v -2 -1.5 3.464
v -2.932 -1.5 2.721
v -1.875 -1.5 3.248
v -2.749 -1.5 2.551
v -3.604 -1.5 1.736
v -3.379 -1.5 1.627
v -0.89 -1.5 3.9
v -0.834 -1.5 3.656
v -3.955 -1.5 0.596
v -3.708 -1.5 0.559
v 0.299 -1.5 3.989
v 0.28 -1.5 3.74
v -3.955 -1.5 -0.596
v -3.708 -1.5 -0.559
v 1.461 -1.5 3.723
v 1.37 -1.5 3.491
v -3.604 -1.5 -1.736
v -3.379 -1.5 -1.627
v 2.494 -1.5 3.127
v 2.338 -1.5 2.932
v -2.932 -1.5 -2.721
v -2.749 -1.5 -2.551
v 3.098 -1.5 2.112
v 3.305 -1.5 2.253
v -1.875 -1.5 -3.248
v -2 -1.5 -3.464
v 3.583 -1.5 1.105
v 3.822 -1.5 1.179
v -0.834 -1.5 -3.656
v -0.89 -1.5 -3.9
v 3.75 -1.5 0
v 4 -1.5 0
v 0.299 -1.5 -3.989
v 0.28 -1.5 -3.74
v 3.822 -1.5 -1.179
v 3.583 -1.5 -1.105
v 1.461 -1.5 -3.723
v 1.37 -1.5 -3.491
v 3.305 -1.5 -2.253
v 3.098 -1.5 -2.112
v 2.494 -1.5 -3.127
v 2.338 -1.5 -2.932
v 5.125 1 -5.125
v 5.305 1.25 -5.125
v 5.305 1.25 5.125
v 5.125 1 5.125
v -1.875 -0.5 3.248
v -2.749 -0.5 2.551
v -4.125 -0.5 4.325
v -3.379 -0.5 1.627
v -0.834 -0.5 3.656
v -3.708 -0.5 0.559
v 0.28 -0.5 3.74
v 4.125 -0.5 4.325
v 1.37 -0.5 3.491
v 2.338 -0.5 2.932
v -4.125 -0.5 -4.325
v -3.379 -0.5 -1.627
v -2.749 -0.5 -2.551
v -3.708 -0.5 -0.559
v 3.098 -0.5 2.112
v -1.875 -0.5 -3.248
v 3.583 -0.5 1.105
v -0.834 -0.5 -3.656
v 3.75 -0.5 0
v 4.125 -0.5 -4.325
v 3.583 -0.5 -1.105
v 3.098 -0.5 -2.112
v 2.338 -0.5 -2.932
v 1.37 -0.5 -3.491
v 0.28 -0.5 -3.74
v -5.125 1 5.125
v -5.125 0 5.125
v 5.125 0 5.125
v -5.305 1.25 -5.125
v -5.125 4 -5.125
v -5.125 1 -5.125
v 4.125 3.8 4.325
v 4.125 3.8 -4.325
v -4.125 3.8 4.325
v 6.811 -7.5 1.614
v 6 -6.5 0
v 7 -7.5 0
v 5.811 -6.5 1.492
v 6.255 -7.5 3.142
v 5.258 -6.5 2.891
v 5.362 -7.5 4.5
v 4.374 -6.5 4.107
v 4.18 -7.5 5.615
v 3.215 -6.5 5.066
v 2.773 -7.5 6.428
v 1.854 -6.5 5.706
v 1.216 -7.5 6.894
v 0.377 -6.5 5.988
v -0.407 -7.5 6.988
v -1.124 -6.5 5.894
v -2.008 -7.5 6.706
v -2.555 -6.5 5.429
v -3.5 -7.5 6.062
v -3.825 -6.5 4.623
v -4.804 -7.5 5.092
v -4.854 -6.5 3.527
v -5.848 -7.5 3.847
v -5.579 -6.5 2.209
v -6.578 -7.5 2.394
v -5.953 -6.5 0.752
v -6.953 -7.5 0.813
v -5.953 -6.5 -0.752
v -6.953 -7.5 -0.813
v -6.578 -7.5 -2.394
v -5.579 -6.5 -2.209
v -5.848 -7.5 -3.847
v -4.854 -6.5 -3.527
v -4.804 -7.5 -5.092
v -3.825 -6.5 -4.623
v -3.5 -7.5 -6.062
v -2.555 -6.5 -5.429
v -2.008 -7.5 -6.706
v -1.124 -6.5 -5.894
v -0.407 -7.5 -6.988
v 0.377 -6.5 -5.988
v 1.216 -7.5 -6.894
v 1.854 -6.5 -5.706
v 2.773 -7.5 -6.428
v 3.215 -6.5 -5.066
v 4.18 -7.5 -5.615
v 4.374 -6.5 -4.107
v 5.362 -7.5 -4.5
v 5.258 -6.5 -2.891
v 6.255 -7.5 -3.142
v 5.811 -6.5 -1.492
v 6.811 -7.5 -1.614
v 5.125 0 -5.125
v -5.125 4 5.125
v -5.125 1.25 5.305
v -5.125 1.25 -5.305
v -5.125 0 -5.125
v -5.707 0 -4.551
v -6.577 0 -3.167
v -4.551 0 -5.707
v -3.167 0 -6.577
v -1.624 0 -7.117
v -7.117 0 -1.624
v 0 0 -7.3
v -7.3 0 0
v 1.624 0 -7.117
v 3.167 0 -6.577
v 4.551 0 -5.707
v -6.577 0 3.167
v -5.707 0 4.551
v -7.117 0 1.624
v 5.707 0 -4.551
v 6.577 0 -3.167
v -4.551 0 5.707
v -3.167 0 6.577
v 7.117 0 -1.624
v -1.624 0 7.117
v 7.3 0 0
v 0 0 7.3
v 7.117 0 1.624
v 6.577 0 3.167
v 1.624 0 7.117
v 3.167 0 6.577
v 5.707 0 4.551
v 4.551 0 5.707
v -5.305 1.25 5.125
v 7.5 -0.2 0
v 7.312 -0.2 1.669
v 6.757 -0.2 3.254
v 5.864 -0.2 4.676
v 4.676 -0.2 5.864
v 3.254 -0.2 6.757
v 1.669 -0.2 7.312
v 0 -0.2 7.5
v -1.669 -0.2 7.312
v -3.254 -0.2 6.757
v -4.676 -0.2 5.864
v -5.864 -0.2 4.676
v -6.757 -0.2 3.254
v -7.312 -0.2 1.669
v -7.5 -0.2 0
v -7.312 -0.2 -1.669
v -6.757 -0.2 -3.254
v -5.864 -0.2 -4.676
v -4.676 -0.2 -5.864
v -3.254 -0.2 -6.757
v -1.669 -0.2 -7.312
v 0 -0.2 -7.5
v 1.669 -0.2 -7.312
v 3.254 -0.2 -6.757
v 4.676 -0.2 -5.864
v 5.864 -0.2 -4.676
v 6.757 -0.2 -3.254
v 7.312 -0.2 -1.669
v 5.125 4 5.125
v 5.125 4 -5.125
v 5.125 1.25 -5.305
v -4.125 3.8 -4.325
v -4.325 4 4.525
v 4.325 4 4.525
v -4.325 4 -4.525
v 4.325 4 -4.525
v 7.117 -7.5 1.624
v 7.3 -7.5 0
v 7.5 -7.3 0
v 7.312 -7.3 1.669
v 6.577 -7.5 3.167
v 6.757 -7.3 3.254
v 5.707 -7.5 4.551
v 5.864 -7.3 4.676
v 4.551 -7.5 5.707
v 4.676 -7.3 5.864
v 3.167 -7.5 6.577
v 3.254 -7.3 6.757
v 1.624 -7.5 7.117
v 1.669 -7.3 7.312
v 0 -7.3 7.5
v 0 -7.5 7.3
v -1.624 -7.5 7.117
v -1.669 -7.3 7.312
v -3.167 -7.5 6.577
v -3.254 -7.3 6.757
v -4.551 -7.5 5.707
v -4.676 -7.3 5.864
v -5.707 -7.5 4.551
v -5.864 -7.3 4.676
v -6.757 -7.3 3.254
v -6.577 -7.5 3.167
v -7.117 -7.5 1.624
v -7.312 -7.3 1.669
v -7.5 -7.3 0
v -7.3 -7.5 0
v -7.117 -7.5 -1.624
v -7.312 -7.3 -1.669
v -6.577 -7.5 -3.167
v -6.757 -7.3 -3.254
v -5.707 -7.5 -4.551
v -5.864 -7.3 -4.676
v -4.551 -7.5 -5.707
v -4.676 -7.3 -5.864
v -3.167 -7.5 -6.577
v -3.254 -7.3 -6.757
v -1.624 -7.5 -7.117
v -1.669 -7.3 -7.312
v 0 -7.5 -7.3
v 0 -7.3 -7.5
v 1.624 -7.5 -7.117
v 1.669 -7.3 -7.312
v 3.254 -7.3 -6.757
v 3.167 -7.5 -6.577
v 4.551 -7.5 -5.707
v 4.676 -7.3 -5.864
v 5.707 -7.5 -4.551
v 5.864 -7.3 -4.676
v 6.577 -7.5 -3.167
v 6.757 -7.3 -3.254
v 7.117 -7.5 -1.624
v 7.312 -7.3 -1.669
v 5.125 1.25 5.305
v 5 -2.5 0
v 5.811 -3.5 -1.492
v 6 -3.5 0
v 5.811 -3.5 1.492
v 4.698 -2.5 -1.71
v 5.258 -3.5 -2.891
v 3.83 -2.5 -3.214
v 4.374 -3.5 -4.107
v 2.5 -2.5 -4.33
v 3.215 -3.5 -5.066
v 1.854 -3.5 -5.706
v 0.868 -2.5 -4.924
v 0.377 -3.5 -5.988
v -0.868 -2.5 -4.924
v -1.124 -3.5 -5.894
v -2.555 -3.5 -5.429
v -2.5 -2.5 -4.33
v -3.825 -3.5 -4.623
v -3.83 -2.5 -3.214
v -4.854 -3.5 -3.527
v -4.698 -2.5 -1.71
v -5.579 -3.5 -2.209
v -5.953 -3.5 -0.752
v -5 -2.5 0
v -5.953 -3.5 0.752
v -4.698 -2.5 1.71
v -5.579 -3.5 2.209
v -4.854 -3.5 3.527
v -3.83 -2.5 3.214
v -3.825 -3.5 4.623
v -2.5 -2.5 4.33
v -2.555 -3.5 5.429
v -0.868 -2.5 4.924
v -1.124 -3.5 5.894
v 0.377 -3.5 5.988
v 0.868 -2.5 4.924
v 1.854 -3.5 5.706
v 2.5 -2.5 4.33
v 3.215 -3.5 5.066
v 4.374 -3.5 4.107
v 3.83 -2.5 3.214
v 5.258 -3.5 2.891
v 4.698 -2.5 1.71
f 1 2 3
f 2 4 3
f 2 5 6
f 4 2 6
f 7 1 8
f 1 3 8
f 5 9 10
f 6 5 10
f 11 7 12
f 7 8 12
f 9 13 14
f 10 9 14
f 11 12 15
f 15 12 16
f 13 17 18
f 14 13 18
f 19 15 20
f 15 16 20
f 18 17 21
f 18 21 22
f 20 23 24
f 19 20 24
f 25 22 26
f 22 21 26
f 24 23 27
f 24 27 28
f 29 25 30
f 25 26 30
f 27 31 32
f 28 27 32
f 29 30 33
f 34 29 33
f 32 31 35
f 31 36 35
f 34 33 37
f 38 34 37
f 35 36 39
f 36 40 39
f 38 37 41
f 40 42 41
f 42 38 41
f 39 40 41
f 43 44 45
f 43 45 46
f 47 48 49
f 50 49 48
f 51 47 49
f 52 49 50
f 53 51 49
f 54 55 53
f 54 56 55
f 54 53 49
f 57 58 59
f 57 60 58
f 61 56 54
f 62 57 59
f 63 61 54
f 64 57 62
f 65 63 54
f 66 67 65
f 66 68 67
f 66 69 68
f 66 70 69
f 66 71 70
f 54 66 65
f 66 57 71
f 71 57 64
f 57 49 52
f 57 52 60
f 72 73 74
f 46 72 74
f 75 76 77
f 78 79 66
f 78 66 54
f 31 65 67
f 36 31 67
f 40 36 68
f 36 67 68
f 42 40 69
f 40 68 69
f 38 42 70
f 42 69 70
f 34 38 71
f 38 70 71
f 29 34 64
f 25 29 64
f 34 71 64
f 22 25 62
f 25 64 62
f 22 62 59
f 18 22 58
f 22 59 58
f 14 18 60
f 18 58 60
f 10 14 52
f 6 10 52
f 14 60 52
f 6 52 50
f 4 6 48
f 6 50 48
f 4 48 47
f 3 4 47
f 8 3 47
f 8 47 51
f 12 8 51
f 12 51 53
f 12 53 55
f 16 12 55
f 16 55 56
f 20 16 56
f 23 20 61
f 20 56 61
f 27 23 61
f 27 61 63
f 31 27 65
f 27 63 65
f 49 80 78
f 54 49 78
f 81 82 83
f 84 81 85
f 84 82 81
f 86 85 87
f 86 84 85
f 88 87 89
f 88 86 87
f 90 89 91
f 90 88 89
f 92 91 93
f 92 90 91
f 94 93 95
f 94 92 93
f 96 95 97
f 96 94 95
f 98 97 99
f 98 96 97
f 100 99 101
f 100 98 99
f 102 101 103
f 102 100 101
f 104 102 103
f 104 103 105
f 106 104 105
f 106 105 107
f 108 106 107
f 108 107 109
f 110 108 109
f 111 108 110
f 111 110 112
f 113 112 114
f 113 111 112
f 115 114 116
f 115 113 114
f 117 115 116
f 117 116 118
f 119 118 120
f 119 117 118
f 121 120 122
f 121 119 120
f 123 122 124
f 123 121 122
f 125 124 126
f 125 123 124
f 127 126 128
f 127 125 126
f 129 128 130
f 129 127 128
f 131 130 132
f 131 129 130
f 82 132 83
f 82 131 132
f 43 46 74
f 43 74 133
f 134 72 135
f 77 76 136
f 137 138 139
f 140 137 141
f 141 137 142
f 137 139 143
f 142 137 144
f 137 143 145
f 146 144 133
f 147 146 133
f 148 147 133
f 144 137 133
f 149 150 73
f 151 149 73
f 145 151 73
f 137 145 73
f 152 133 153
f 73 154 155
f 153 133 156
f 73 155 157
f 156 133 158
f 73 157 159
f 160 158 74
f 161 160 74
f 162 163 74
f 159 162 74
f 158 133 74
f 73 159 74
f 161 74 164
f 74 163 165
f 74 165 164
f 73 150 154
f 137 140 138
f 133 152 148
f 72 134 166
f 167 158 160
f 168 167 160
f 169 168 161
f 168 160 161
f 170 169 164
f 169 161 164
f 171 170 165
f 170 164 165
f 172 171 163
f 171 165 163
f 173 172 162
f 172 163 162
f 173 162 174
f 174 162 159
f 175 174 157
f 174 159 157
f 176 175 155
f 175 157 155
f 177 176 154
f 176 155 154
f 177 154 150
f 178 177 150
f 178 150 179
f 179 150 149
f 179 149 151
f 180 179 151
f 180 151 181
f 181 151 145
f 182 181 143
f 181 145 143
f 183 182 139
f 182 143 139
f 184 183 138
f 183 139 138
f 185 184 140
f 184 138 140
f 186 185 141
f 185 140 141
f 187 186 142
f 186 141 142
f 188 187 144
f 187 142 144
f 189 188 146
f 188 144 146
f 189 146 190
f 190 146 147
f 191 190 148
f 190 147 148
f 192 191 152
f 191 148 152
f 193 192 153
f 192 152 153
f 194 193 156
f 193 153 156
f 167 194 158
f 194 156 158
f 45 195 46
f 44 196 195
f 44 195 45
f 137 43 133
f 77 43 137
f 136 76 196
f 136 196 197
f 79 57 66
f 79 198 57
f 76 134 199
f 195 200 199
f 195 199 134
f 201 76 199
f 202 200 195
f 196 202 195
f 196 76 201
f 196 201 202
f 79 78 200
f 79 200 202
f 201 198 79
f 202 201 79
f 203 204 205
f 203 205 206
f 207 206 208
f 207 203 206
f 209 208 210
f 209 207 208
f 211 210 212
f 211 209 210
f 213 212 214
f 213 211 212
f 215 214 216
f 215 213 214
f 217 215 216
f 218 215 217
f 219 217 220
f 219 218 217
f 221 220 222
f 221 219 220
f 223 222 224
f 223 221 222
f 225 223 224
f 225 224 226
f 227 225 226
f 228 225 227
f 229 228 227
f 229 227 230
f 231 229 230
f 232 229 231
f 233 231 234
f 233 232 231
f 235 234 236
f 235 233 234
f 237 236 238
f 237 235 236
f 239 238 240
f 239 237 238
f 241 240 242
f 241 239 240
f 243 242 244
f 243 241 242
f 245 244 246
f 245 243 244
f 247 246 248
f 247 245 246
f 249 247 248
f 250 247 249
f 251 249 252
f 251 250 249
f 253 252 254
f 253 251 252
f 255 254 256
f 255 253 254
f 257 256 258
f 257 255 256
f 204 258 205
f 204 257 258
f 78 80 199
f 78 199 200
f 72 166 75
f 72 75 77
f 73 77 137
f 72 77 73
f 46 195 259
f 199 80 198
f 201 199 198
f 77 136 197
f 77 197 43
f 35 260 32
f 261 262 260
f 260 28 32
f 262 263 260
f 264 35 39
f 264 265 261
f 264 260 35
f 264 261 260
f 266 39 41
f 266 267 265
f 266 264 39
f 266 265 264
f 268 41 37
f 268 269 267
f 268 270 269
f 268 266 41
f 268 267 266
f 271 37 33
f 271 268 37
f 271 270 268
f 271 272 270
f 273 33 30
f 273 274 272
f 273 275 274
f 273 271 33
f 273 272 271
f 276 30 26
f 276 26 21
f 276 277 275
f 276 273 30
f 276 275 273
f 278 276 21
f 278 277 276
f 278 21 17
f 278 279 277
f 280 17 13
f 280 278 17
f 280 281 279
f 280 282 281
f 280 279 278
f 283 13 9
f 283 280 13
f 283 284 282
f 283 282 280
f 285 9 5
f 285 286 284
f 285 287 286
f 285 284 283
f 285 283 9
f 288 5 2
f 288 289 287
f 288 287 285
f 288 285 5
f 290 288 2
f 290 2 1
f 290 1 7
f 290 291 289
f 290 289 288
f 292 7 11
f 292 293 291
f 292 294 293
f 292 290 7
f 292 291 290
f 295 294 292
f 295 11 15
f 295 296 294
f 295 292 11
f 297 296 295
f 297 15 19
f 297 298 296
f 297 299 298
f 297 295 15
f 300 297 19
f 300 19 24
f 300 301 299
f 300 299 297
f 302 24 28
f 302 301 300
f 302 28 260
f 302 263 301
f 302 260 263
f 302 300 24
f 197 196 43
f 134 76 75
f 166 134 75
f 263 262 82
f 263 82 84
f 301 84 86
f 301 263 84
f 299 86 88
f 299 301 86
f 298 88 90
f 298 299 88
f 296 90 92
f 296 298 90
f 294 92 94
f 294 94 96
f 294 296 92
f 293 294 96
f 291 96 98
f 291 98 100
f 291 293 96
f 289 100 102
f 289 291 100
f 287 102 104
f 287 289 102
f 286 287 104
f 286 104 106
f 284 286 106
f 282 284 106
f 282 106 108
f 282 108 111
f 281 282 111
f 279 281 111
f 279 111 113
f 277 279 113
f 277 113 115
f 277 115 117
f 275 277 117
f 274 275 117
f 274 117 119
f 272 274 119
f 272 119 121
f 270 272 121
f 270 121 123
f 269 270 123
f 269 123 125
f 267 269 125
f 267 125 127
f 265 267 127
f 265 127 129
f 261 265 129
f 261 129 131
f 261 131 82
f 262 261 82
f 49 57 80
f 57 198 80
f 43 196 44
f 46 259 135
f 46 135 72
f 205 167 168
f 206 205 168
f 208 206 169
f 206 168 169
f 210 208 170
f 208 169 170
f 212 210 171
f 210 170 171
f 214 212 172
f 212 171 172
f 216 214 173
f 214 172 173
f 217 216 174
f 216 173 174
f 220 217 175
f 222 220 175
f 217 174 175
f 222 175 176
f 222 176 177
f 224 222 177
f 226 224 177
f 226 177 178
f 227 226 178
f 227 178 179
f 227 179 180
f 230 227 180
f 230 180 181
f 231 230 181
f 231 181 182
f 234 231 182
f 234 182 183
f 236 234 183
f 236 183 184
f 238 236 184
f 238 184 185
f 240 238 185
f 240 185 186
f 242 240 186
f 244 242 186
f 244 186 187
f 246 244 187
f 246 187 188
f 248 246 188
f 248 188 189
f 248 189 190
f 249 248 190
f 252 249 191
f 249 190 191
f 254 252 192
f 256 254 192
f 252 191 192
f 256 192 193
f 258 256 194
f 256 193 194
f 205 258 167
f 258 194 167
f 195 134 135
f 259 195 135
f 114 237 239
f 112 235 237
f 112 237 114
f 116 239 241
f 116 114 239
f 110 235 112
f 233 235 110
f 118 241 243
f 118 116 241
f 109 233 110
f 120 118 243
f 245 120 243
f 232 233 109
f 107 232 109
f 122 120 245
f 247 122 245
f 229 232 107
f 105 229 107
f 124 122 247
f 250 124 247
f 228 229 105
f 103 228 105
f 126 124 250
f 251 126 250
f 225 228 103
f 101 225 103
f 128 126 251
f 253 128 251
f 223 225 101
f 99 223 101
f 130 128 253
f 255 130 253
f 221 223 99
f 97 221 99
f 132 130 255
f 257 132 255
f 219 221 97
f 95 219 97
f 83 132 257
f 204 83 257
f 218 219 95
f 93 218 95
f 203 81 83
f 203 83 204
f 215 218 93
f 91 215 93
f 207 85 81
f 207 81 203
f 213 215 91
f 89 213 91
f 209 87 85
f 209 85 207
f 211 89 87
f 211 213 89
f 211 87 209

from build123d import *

# Parameters (mm, degrees)
CROQUIS1_W              = 10.25
CROQUIS1_H              = 10.25
CROQUIS1_W_2            = 8.25
CROQUIS1_H_2            = 8.65
SALIENTE_EXTRUIR1_DEPTH = 4
SALIENTE_EXTRUIR2_DEPTH = 10.25
MATRIZC1_COUNT          = 4
CROQUIS3_R              = 7.5
CROQUIS3_W              = 8.25
CROQUIS3_H              = 8.65
SALIENTE_EXTRUIR3_DEPTH = 1
CROQUIS5_R              = 7.5
CROQUIS5_R_2            = 6
SALIENTE_EXTRUIR4_DEPTH = 6.5
CHAFL_N2_SIZE           = 0.2
CHAFL_N3_SIZE           = 1
SALIENTE_EXTRUIR5_START = -4.5
CROQUIS6_R              = 6
CROQUIS6_R_2            = 3.75
SALIENTE_EXTRUIR5_DEPTH = 1
CHAFL_N4_SIZE           = 2


with BuildPart() as part:
    # Croquis1 → Saliente-Extruir1 (new body)
    with BuildSketch(Plane(origin=(0, 0, 0), x_dir=(1, 0, 0), z_dir=(0, 1, 0))):
        Rectangle(CROQUIS1_W, CROQUIS1_H)
        Rectangle(CROQUIS1_W_2, CROQUIS1_H_2, mode=Mode.SUBTRACT)
    extrude(amount=SALIENTE_EXTRUIR1_DEPTH)

    # Croquis2 → Saliente-Extruir2 (add)
    with BuildSketch(Plane(origin=(5.125, 0, 0), x_dir=(0, 0, -1), z_dir=(1, 0, 0))):
        Polygon((-5.125, 4), (-5.305, 1.25), (-5.125, 1), align=None)
    saliente_extruir2 = extrude(amount=-SALIENTE_EXTRUIR2_DEPTH)

    # MatrizC1: Saliente-Extruir2 ×4 about axis
    matrizc1_axis = Axis((0, 3.15, 0), (0, -1, 0))
    for i in range(1, MATRIZC1_COUNT):
        add(saliente_extruir2.rotate(matrizc1_axis, i * 360 / MATRIZC1_COUNT))

    # Croquis3 → Saliente-Extruir3 (add)
    with BuildSketch(Plane.XZ):
        Circle(CROQUIS3_R)
        Rectangle(CROQUIS3_W, CROQUIS3_H, mode=Mode.SUBTRACT)
    extrude(amount=SALIENTE_EXTRUIR3_DEPTH)

    # Croquis5 → Saliente-Extruir4 (add)
    with BuildSketch(Plane.XZ.offset(1)):
        Circle(CROQUIS5_R)
        Circle(CROQUIS5_R_2, mode=Mode.SUBTRACT)
    extrude(amount=SALIENTE_EXTRUIR4_DEPTH)

    # Chaflán2
    chafl_n2_edges = [part.edges().sort_by_distance(p)[0] for p in [
        (-4.125, 4, 0),
        (0, 4, 4.325),
        (4.125, 4, 0),
        (0, 4, -4.325),
        (-7.5, 0, 0),
        (-7.5, -7.5, 0),
    ]]
    chamfer(chafl_n2_edges, length=CHAFL_N2_SIZE)

    # Chaflán3
    chafl_n3_edges = [part.edges().sort_by_distance(p)[0] for p in [
        (-6, -7.5, 0),
    ]]
    chamfer(chafl_n3_edges, length=CHAFL_N3_SIZE)

    # Croquis6 → Saliente-Extruir5 (add)
    with BuildSketch(Plane(origin=(0, 4, 0), x_dir=(1, 0, 0), z_dir=(0, 1, 0)).offset(SALIENTE_EXTRUIR5_START)):
        Circle(CROQUIS6_R)
        Circle(CROQUIS6_R_2, mode=Mode.SUBTRACT)
    extrude(amount=-SALIENTE_EXTRUIR5_DEPTH)

    # Chaflán4
    chafl_n4_edges = [part.edges().sort_by_distance(p)[0] for p in [
        (-6, -1.5, 0),
    ]]
    chamfer(chafl_n4_edges, length=CHAFL_N4_SIZE)


solid = part.part
